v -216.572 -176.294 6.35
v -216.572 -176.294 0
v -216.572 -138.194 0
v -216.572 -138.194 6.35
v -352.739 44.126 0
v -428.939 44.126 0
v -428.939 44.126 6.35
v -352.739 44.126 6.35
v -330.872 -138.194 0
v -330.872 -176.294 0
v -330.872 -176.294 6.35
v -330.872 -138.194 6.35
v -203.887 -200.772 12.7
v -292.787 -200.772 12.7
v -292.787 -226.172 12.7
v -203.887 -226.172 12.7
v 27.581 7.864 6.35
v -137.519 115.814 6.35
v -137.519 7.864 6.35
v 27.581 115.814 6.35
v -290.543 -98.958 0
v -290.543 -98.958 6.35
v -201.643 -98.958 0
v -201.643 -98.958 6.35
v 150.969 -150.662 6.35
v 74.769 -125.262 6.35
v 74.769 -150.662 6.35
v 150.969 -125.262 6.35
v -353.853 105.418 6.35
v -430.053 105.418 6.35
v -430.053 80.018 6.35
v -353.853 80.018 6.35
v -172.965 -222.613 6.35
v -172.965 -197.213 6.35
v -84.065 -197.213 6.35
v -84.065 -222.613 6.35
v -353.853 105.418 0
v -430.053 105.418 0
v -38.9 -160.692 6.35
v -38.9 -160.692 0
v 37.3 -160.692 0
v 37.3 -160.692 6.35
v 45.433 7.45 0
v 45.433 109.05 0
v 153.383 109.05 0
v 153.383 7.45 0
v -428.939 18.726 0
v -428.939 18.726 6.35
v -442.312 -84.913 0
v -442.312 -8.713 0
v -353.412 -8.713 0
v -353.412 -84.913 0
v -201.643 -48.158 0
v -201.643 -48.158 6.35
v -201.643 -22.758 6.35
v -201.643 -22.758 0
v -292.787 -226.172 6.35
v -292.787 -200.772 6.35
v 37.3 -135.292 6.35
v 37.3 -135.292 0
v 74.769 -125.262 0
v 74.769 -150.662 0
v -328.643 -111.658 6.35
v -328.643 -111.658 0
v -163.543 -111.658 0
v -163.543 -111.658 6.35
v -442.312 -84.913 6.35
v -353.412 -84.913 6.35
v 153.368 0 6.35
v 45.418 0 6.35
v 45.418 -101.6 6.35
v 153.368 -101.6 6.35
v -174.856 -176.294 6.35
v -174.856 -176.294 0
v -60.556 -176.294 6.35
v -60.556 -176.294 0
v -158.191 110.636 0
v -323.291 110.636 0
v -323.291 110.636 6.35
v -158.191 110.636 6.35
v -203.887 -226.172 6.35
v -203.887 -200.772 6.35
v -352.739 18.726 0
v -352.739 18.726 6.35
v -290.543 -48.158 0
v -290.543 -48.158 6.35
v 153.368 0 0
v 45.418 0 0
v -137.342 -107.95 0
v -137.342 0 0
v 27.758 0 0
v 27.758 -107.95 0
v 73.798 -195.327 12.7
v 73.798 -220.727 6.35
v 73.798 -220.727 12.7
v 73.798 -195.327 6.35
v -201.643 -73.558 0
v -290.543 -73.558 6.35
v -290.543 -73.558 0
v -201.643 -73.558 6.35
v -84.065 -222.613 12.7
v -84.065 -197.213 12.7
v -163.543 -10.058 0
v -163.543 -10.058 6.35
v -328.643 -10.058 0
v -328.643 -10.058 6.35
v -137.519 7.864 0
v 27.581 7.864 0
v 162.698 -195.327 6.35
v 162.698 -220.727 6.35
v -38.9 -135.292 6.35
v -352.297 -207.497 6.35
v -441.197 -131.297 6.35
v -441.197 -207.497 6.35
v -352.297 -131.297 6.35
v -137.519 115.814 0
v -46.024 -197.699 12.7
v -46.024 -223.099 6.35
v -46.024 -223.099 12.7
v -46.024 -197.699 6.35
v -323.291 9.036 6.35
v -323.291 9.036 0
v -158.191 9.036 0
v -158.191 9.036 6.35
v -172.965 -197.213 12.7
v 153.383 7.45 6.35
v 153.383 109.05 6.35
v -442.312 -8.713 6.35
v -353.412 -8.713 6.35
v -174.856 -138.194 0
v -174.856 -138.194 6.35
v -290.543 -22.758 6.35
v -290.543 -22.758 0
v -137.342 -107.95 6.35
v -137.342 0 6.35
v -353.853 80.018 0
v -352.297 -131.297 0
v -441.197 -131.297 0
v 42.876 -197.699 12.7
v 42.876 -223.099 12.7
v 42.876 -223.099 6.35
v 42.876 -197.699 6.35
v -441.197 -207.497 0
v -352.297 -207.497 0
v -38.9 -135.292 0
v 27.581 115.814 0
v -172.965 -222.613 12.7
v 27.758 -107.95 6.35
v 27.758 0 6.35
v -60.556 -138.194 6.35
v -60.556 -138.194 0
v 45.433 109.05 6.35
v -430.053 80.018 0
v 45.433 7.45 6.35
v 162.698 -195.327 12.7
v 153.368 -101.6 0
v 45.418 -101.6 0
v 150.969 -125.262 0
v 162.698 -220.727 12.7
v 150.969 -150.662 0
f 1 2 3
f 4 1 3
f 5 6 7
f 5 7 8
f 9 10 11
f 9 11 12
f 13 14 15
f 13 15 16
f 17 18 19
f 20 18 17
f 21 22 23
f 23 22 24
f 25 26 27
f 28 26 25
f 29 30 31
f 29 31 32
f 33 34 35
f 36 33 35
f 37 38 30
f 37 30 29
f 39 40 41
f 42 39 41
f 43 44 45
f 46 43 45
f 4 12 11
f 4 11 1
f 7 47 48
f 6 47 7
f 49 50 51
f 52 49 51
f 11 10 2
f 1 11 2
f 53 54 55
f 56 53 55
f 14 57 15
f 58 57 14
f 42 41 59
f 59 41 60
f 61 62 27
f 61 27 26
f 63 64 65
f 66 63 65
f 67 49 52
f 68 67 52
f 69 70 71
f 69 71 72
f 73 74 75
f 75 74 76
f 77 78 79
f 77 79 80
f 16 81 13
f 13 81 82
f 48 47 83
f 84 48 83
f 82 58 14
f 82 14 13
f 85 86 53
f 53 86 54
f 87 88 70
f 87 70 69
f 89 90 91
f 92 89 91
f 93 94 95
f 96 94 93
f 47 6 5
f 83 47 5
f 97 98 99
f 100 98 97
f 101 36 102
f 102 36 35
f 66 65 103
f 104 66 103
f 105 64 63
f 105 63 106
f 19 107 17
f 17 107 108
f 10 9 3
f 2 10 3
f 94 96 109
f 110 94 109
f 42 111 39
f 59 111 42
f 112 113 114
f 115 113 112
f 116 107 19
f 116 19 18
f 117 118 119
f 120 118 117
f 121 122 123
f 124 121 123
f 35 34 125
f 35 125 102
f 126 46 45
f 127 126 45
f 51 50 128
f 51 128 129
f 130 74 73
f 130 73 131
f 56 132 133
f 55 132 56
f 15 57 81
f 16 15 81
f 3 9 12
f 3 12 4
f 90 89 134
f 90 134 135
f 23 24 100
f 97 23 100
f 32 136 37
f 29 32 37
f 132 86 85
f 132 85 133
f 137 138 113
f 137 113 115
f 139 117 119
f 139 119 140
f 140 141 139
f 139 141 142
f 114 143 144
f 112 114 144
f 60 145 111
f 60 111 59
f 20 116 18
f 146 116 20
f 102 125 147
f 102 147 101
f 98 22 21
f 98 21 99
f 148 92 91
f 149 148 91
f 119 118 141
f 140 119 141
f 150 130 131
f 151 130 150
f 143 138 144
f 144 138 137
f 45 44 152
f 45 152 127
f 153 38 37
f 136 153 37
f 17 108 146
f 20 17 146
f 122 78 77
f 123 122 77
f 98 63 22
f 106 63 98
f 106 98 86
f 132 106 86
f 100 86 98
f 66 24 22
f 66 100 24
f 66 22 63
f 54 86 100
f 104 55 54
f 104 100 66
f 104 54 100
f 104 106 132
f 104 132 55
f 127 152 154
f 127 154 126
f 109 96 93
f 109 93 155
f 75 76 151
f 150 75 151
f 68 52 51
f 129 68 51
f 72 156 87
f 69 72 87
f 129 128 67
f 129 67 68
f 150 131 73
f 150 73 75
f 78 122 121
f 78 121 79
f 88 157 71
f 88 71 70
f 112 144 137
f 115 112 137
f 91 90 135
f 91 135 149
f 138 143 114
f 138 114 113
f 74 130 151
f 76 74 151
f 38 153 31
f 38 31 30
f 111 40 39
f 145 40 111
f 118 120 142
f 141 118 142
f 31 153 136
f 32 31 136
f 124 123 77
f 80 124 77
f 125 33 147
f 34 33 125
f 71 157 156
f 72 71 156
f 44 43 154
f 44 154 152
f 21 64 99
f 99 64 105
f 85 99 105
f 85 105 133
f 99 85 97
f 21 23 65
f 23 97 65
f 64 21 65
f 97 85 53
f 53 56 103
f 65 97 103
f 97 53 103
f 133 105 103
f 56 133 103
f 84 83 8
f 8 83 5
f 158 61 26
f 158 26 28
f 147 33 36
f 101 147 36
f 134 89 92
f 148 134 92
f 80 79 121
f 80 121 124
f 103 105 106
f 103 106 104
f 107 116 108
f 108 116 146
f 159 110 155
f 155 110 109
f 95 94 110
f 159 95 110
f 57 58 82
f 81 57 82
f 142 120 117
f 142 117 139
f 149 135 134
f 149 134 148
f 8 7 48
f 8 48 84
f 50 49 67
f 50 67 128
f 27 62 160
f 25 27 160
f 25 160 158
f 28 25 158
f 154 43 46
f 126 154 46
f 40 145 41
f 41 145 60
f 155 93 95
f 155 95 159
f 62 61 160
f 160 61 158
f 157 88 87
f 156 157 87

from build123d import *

# Parameters (mm, degrees)
F1_W      = 165.1
F1_H      = 107.95
F7_DEPTH  = 6.35
F2_W      = 165.1
F2_H      = 107.95
F3_W      = 107.95
F3_H      = 101.6
F4_W      = 107.95
F4_H      = 101.6
F5_W      = 165.1
F5_H      = 101.6
F6_W      = 165.1
F6_H      = 101.6
F8_W      = 88.9
F8_H      = 25.4
F9_DEPTH  = 6.351
F10_W     = 114.3
F10_H     = 38.1
F15_DEPTH = 6.35
F11_W     = 76.2
F11_H     = 25.4
F12_W     = 76.2
F12_H     = 25.4
F13_W     = 88.9
F13_H     = 76.2
F14_W     = 88.9
F14_H     = 25.4


# Not quite as in the source:
# - a variable given as a bare number and used for a length is read in inches; the dataset says mm whatever the document's units were


with BuildPart() as f7:
    # F1 (on Top) → F7 (new body)
    with BuildSketch(Plane.XY):
        with Locations((-54.9687035382, 61.838542049)):
            Rectangle(F1_W, F1_H)
    extrude(amount=F7_DEPTH)


with BuildPart() as f7b:
    # F2 (on Top) → F7, piece 2 (new body)
    with BuildSketch(Plane.XY):
        with Locations((-54.7917824507, -53.975)):
            Rectangle(F2_W, F2_H)
    extrude(amount=F7_DEPTH)


with BuildPart() as f7c:
    # F3 (on Top) → F7, piece 3 (new body)
    with BuildSketch(Plane.XY):
        with Locations((99.4075111032, 58.2500463382)):
            Rectangle(F3_W, F3_H)
    extrude(amount=F7_DEPTH)


with BuildPart() as f7d:
    # F4 (on Top) → F7, piece 4 (new body)
    with BuildSketch(Plane.XY):
        with Locations((99.3931097448, -50.8)):
            Rectangle(F4_W, F4_H)
    extrude(amount=F7_DEPTH)


with BuildPart() as f7e:
    # F5 (on Top) → F7, piece 5 (new body)
    with BuildSketch(Plane.XY):
        with Locations((-246.0931133747, -60.8584986448)):
            Rectangle(F5_W, F5_H)
    extrude(amount=F7_DEPTH)

    # F8 (on face) → F9 (cut, through all)
    with BuildSketch(Plane.XY.offset(6.35)):
        with Locations((-246.0931133747, -86.2584986448)):
            Rectangle(F8_W, F8_H)
        with Locations((-246.0931133747, -35.4584986448)):
            Rectangle(F8_W, F8_H)
    extrude(amount=-F9_DEPTH, mode=Mode.SUBTRACT)


with BuildPart() as f7f:
    # F6 (on Top) → F7, piece 6 (new body)
    with BuildSketch(Plane.XY):
        with Locations((-240.7411709428, 59.8363118468)):
            Rectangle(F6_W, F6_H)
    extrude(amount=F7_DEPTH)


with BuildPart() as f15:
    # F10 (on Top) → F15 (new body)
    with BuildSketch(Plane.XY):
        with Locations((-117.7062753201, -157.2435519218)):
            Rectangle(F10_W, F10_H)
    extrude(amount=F15_DEPTH)


with BuildPart() as f15b:
    # F10 (on Top) → F15, piece 2 (new body)
    with BuildSketch(Plane.XY):
        with Locations((-273.7219098568, -157.2435519218)):
            Rectangle(F10_W, F10_H)
    extrude(amount=F15_DEPTH)


with BuildPart() as f15c:
    # F11 (on Top) → F15, piece 3 (new body)
    with BuildSketch(Plane.XY):
        with Locations((-0.7997755945, -147.9919765472)):
            Rectangle(F11_W, F11_H)
    extrude(amount=F15_DEPTH)


with BuildPart() as f15d:
    # F11 (on Top) → F15, piece 4 (new body)
    with BuildSketch(Plane.XY):
        with Locations((112.8687295079, -137.962407279)):
            Rectangle(F11_W, F11_H)
    extrude(amount=F15_DEPTH)


with BuildPart() as f15e:
    # F12 (on Top) → F15, piece 5 (new body)
    with BuildSketch(Plane.XY):
        with Locations((-390.8388656616, 31.4260042876)):
            Rectangle(F12_W, F12_H)
    extrude(amount=F15_DEPTH)


with BuildPart() as f15f:
    # F12 (on Top) → F15, piece 6 (new body)
    with BuildSketch(Plane.XY):
        with Locations((-391.9532639027, 92.717849803)):
            Rectangle(F12_W, F12_H)
    extrude(amount=F15_DEPTH)


with BuildPart() as f15g:
    # F13 (on Top) → F15, piece 7 (new body)
    with BuildSketch(Plane.XY):
        with Locations((-397.8616445541, -46.812955761)):
            Rectangle(F13_W, F13_H)
    extrude(amount=F15_DEPTH)


with BuildPart() as f15h:
    # F13 (on Top) → F15, piece 8 (new body)
    with BuildSketch(Plane.XY):
        with Locations((-396.7472463131, -169.3966728687)):
            Rectangle(F13_W, F13_H)
    extrude(amount=F15_DEPTH)


with BuildPart() as f15i:
    # F14 (on face) → F15, piece 9 (new body)
    with BuildSketch(Plane.XY.offset(6.35)):
        with Locations((-1.5743746638, -210.3992934942)):
            Rectangle(F14_W, F14_H)
    extrude(amount=F15_DEPTH)


with BuildPart() as f15j:
    # F14 (on face) → F15, piece 10 (new body)
    with BuildSketch(Plane.XY.offset(6.35)):
        with Locations((-128.5148709297, -209.9128429174)):
            Rectangle(F14_W, F14_H)
    extrude(amount=F15_DEPTH)


with BuildPart() as f15k:
    # F14 (on face) → F15, piece 11 (new body)
    with BuildSketch(Plane.XY.offset(6.35)):
        with Locations((-248.337194252, -213.4719256639)):
            Rectangle(F14_W, F14_H)
    extrude(amount=F15_DEPTH)


with BuildPart() as f15l:
    # F14 (on face) → F15, piece 12 (new body)
    with BuildSketch(Plane.XY.offset(6.35)):
        with Locations((118.247956109, -208.0265666962)):
            Rectangle(F14_W, F14_H)
    extrude(amount=F15_DEPTH)


solid = Compound([f7.part, f7b.part, f7c.part, f7d.part, f7e.part, f7f.part, f15.part, f15b.part, f15c.part, f15d.part, f15e.part, f15f.part, f15g.part, f15h.part, f15i.part, f15j.part, f15k.part, f15l.part])
